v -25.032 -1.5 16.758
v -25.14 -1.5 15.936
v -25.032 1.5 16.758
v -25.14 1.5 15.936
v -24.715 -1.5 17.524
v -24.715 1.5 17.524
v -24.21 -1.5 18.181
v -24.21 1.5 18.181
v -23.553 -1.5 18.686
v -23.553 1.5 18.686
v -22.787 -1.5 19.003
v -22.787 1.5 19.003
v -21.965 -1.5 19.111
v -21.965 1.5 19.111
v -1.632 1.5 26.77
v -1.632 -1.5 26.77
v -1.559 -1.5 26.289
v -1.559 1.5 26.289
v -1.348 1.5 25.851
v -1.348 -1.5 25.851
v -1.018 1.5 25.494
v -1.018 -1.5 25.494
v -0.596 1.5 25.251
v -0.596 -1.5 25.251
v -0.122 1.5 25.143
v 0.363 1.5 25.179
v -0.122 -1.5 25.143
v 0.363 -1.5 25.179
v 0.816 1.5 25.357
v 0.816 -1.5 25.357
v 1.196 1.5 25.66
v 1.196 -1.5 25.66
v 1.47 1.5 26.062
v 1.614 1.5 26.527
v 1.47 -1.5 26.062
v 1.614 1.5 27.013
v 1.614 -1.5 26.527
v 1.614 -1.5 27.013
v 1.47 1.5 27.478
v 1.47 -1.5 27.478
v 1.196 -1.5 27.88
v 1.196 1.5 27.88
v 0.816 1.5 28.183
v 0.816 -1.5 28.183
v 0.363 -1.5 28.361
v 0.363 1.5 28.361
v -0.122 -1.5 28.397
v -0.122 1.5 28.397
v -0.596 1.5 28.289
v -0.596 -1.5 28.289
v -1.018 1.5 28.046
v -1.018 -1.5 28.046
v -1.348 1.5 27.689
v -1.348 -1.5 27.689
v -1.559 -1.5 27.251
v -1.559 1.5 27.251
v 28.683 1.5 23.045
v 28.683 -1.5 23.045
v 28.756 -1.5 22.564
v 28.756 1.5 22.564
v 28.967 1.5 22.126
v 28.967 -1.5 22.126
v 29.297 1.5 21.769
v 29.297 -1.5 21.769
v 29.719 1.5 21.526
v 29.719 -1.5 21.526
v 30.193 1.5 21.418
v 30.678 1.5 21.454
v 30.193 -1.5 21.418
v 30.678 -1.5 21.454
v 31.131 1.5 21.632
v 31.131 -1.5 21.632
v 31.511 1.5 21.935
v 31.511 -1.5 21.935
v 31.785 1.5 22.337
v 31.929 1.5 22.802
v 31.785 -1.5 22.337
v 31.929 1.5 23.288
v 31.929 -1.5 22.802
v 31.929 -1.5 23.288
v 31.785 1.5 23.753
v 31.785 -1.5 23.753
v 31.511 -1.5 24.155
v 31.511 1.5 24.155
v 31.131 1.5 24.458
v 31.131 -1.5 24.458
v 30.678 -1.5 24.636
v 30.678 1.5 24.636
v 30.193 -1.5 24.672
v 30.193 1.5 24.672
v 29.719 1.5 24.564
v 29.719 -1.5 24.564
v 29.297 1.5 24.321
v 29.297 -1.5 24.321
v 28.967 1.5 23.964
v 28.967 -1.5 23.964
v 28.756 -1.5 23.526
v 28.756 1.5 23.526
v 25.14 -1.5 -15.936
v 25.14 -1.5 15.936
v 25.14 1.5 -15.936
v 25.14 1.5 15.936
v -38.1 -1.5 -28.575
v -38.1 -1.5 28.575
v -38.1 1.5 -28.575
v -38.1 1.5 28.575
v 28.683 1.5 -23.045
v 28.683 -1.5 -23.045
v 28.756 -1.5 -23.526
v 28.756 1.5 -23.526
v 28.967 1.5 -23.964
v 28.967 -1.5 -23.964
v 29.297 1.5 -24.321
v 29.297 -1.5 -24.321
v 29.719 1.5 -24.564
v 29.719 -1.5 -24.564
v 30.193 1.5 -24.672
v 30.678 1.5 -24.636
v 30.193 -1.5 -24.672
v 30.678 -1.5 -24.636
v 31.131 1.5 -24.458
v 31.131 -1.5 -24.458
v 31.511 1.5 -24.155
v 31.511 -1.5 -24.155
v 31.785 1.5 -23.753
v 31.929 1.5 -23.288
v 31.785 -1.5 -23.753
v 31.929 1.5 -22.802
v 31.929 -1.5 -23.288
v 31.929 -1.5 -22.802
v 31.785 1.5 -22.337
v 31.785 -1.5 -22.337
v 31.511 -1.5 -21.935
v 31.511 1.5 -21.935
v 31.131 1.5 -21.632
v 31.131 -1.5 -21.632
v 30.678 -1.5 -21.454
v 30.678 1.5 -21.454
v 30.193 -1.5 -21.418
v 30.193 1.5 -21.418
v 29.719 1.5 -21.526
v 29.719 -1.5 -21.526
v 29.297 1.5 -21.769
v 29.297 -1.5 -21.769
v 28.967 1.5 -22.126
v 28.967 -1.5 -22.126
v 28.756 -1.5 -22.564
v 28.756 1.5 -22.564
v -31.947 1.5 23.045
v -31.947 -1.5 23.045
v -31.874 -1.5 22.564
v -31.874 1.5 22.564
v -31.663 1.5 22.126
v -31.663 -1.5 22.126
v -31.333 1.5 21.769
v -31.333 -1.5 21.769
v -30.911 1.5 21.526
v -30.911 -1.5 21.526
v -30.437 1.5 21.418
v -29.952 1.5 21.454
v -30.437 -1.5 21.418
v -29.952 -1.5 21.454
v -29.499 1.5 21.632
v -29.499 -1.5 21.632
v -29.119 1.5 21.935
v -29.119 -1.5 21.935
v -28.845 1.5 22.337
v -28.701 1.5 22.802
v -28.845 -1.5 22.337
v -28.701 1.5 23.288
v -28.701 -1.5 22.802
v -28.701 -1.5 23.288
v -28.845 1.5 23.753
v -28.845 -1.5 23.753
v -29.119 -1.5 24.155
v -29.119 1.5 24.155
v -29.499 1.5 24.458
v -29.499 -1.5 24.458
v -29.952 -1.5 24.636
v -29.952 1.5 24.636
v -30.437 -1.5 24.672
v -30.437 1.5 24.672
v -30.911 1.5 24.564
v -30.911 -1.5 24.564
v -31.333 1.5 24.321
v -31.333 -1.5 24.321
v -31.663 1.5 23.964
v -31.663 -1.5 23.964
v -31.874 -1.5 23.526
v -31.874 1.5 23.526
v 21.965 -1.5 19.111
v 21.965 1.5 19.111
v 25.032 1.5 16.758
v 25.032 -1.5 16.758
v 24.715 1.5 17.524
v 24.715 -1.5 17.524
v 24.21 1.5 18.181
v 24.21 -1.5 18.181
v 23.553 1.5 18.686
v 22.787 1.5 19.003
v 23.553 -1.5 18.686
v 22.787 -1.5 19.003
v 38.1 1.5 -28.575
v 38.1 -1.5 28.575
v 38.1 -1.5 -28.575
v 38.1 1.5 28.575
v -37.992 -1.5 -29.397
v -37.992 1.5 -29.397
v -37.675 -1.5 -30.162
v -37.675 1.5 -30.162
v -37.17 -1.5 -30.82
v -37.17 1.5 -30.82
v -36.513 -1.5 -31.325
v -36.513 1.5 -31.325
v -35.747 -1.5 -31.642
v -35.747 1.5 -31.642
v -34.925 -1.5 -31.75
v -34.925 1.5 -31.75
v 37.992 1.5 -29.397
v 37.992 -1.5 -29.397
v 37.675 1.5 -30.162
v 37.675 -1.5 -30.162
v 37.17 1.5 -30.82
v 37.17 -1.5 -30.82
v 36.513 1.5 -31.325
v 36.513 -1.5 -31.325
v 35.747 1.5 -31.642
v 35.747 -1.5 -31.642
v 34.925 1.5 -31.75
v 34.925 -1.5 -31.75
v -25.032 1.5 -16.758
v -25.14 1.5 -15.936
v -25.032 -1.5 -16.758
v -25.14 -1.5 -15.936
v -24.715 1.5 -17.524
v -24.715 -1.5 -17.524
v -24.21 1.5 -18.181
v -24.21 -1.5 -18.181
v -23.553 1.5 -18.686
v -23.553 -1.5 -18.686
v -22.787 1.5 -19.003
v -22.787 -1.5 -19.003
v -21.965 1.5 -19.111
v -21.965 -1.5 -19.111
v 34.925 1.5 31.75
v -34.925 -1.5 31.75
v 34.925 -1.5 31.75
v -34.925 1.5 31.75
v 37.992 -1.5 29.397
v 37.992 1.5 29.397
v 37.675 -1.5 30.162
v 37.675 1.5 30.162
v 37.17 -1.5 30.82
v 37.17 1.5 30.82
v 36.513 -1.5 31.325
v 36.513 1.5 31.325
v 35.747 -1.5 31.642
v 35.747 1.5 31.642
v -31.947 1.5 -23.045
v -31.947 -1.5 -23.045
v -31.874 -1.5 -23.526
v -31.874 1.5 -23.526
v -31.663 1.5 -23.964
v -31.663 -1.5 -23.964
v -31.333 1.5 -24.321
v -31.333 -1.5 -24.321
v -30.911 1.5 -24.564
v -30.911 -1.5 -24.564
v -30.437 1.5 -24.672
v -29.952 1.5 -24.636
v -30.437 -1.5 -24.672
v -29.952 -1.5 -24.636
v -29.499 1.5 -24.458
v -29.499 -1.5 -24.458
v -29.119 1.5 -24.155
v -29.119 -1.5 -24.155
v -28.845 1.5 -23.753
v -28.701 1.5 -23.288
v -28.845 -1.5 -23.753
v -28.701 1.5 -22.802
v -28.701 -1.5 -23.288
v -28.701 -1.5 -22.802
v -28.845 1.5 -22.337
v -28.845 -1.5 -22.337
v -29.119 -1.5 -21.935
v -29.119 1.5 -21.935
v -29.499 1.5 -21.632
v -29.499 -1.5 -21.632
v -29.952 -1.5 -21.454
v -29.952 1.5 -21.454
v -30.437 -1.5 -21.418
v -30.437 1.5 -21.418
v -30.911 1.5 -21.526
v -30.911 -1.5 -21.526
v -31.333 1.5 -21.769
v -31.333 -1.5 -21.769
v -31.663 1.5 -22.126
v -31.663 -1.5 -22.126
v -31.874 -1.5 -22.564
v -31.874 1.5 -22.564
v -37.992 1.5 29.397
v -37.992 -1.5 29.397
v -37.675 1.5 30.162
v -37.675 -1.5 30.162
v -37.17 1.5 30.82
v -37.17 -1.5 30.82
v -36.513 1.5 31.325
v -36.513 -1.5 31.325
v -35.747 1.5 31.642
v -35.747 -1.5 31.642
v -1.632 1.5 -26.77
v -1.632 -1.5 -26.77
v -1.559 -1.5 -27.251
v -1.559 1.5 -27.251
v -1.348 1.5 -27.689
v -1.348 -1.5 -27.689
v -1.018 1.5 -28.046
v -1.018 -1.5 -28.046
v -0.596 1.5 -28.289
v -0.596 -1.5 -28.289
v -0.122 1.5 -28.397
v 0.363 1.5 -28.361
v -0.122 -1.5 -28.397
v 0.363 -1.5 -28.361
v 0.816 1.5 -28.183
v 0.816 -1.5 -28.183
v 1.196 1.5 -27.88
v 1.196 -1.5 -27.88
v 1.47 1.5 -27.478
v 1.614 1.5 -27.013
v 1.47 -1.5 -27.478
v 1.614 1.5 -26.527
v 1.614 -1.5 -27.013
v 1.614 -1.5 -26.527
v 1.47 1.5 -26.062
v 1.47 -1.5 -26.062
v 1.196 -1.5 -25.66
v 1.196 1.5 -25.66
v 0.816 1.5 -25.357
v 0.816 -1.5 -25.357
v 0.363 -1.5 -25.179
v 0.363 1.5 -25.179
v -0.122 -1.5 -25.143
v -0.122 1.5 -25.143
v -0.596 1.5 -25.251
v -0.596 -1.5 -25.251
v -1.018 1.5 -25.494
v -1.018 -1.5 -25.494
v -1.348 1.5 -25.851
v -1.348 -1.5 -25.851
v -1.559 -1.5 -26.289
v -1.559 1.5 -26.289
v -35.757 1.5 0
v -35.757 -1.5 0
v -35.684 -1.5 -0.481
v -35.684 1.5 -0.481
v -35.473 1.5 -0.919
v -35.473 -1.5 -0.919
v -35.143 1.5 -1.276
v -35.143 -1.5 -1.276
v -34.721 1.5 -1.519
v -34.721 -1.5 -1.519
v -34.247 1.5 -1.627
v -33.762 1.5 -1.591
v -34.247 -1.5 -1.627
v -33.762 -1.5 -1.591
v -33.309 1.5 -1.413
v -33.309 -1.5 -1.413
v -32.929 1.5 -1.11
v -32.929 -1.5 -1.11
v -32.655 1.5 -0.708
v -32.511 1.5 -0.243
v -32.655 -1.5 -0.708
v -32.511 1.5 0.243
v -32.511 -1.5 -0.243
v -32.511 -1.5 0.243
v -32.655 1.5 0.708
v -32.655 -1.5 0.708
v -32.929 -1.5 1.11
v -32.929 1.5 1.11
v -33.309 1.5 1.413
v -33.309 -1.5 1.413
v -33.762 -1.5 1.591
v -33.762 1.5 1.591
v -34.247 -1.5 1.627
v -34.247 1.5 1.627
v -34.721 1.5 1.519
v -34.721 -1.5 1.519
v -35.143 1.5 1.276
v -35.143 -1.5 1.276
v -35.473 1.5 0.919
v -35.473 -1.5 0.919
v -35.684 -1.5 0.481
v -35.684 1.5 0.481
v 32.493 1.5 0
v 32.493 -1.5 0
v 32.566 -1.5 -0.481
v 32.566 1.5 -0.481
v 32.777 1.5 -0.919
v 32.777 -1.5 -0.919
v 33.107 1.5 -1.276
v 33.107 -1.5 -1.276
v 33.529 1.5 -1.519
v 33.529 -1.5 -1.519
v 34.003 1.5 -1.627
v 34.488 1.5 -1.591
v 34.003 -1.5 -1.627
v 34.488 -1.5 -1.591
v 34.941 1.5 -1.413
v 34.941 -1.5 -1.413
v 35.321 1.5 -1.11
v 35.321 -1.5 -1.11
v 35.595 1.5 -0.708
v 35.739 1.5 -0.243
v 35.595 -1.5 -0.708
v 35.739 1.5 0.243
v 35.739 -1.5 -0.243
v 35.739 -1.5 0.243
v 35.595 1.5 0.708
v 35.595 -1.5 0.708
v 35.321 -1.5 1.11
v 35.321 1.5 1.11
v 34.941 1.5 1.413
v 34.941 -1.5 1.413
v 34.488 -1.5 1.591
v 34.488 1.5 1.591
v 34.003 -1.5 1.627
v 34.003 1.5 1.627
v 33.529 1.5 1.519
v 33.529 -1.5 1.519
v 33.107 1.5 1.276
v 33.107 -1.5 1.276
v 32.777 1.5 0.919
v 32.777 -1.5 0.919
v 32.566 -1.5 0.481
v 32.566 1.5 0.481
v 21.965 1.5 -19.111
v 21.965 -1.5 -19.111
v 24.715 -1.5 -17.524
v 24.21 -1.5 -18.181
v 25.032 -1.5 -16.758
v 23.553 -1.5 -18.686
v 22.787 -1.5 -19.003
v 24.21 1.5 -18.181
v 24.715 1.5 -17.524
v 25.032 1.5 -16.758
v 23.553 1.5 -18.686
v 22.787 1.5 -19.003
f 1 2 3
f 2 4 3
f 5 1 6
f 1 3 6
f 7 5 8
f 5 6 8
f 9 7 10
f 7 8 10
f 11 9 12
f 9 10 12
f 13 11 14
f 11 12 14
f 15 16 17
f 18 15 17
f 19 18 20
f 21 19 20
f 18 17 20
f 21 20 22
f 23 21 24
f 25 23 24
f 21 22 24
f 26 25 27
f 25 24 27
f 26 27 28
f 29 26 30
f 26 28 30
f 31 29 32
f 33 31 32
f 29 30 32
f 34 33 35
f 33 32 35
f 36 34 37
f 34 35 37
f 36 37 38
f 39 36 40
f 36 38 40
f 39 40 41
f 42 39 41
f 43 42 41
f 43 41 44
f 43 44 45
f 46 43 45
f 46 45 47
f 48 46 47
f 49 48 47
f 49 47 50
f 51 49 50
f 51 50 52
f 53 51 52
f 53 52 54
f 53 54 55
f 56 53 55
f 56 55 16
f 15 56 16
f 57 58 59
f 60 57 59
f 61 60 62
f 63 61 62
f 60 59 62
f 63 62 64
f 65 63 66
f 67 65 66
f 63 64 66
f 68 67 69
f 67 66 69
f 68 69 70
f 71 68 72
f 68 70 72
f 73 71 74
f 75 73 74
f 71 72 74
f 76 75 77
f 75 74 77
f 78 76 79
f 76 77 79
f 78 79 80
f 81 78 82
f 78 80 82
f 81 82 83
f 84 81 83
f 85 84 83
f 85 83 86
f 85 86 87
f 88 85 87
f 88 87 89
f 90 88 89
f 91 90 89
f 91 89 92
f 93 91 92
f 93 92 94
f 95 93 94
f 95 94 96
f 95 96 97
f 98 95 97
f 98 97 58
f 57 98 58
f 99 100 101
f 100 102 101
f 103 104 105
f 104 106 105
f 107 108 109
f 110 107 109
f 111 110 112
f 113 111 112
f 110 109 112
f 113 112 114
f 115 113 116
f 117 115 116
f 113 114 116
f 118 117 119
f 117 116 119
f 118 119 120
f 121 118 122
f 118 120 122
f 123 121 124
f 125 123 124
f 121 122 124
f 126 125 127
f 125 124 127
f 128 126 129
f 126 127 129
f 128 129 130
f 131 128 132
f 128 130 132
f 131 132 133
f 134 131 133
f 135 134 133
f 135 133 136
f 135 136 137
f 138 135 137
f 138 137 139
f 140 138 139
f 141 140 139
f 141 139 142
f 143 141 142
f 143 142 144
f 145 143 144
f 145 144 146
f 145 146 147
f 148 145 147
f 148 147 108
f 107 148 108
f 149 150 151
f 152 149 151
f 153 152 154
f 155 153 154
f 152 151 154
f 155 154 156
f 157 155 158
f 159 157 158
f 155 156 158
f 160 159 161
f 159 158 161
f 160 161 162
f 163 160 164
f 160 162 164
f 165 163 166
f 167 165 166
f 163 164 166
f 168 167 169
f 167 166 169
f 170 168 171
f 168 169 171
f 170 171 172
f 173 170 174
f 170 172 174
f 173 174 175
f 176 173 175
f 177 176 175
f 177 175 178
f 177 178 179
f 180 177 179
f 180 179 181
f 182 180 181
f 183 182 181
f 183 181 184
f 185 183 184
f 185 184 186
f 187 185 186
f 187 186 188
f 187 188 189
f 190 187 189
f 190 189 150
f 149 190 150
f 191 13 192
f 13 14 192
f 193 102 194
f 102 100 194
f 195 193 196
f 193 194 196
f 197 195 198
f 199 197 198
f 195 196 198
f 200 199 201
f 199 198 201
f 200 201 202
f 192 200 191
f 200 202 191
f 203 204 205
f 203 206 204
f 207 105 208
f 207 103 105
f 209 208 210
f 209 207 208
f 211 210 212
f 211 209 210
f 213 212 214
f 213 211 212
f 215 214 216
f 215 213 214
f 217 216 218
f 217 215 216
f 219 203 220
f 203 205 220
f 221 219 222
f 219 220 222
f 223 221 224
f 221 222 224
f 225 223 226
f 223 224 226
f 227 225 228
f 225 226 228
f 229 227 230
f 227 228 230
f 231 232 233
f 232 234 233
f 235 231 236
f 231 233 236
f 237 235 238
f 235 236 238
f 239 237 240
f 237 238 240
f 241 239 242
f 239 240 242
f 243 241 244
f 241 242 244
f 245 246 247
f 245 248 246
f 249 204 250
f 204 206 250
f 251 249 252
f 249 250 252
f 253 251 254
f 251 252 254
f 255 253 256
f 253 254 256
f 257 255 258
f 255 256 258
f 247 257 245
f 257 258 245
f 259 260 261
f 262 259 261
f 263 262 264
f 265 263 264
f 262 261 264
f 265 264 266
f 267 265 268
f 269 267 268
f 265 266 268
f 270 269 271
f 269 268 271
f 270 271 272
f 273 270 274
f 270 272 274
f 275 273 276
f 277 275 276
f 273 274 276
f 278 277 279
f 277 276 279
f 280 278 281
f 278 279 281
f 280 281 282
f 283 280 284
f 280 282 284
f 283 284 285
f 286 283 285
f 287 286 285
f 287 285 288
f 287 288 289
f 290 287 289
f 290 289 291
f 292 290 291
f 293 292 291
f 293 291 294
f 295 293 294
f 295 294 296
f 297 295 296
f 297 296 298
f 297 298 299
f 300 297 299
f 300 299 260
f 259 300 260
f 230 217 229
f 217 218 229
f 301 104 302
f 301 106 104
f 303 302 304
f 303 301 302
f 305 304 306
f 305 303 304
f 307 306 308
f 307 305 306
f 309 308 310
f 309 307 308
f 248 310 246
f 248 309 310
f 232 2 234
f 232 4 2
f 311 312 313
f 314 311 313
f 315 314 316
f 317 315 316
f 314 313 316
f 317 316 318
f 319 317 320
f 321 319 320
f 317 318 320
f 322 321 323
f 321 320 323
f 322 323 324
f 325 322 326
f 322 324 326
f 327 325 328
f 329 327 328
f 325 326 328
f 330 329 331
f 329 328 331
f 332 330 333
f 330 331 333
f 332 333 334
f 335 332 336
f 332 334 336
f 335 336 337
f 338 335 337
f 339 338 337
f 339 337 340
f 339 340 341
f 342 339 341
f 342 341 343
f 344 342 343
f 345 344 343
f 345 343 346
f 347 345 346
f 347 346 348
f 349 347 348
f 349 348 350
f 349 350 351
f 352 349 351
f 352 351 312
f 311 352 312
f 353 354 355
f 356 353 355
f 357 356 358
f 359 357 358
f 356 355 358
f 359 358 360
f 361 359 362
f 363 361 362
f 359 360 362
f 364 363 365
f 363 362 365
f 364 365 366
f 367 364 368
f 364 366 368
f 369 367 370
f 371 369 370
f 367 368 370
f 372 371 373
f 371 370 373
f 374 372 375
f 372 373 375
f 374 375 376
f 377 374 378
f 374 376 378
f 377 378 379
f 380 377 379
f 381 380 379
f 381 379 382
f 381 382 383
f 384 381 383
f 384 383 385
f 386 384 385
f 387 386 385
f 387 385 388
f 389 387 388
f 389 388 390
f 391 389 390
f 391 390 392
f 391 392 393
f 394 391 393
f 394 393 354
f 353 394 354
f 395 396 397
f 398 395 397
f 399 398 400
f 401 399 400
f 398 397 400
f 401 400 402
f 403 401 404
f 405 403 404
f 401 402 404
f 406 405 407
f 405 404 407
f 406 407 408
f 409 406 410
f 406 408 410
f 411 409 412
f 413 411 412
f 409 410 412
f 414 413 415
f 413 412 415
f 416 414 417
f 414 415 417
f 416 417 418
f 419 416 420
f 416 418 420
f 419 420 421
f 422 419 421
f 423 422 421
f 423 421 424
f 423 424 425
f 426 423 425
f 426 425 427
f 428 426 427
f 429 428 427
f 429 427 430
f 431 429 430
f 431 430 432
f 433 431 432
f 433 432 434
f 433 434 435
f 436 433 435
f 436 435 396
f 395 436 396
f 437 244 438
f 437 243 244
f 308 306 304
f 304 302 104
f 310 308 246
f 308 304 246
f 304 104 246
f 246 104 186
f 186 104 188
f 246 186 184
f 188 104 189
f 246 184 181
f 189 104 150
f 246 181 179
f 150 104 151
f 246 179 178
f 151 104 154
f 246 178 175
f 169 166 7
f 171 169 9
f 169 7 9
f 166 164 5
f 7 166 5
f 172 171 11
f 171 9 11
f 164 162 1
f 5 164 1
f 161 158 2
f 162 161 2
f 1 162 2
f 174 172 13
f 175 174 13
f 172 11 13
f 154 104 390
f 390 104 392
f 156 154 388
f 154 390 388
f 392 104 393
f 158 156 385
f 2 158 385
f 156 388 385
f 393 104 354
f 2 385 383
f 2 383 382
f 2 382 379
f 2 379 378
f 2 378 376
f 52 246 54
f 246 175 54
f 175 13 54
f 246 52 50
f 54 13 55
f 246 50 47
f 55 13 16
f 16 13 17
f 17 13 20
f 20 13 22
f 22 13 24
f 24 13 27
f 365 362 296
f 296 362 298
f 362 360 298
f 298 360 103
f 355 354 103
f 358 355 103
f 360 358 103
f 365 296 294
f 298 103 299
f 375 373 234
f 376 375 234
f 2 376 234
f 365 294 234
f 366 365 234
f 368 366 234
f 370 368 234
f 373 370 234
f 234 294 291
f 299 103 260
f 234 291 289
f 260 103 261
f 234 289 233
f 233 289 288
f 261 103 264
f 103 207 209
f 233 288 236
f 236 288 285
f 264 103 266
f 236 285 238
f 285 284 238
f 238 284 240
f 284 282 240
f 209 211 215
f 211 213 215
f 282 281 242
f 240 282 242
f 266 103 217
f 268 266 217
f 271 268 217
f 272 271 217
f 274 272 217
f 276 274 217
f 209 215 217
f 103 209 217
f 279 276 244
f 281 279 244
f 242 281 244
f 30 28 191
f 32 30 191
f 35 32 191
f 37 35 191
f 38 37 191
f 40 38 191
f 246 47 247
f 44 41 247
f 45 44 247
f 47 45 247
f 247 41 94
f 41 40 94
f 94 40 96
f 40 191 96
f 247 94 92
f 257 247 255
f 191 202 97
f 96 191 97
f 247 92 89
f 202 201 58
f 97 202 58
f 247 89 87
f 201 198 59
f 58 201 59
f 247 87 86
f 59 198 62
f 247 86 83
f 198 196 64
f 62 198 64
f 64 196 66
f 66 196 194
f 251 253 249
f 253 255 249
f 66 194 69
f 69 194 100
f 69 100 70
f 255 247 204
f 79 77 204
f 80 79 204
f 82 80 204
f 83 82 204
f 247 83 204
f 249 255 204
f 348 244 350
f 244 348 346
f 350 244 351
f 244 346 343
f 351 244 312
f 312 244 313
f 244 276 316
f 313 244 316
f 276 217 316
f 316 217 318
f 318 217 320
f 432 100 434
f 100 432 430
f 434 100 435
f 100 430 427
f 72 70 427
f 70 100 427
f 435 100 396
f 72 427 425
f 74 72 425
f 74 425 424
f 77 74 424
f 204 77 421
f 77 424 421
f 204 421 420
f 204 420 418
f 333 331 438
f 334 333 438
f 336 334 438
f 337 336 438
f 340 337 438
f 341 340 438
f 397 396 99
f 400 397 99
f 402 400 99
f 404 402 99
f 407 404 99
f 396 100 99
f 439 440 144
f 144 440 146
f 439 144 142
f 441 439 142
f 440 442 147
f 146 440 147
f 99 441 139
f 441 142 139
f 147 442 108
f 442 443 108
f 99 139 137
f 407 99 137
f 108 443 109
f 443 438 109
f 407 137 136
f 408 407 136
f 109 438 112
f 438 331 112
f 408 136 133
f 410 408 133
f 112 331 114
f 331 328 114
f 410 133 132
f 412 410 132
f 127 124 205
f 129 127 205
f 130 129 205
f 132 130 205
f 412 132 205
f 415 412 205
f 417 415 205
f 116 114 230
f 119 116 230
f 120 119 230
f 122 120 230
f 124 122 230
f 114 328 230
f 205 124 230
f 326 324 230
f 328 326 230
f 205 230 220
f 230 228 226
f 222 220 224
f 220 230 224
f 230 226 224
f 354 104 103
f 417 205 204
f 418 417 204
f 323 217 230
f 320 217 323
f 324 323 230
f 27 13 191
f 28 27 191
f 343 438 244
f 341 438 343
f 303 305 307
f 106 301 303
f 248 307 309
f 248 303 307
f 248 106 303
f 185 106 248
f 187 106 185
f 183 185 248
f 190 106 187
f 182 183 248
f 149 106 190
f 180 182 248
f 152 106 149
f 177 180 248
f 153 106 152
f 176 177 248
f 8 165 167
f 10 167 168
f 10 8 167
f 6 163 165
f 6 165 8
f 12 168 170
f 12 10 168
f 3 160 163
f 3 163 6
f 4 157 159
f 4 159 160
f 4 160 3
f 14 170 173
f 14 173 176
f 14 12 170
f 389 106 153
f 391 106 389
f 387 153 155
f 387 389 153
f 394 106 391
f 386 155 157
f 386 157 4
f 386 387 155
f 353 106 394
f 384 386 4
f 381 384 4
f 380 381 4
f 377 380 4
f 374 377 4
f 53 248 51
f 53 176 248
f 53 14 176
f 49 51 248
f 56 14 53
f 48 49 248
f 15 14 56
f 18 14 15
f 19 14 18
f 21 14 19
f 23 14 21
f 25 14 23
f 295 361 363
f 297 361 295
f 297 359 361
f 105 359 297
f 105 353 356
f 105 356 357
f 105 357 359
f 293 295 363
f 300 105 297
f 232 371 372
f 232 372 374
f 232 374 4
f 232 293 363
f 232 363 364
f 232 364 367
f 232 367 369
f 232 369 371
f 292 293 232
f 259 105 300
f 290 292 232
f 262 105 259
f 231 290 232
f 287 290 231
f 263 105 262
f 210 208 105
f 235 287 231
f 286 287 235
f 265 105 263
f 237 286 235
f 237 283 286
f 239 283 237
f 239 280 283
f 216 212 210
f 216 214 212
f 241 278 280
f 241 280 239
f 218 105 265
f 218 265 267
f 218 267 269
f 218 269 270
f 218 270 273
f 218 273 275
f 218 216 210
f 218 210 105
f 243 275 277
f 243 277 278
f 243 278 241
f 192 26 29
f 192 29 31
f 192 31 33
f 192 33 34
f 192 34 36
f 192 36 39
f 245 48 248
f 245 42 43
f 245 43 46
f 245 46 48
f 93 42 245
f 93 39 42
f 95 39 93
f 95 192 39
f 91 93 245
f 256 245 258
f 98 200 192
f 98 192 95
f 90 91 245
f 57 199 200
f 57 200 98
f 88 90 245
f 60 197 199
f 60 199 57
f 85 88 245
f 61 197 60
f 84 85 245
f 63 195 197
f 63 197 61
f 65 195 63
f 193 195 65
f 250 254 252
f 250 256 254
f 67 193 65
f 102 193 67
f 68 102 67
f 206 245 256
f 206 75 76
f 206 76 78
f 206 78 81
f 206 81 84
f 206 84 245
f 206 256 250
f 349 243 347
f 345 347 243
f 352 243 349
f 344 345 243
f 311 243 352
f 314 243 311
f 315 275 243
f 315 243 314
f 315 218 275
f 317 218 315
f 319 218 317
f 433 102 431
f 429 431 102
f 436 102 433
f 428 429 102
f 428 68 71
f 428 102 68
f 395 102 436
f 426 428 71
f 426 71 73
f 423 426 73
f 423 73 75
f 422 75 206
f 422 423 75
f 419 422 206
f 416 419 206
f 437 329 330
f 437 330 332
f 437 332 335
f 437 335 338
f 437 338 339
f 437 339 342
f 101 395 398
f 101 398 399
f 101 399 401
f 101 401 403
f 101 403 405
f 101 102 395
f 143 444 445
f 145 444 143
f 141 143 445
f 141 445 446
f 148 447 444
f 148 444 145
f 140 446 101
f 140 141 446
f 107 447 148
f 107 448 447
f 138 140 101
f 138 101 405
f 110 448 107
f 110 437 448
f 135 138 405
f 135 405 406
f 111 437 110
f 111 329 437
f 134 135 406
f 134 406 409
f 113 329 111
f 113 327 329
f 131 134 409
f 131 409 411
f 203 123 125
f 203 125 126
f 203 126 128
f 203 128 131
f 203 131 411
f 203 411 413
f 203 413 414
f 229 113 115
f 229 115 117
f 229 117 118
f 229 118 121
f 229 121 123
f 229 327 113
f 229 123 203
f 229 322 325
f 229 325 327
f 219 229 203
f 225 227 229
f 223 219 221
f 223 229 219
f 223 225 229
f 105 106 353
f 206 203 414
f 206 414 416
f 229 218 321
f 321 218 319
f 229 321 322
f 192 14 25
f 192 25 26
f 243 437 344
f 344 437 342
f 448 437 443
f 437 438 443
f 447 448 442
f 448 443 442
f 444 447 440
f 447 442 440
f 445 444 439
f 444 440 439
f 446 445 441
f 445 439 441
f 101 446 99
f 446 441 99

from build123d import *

# Parameters (mm, degrees)
SKETCH1_W                 = 76.2
SKETCH1_H                 = 63.5
SKETCH1_W_2               = 50.280812534
SKETCH1_H_2               = 38.222705752
BOSS_EXTRUDE1_DEPTH       = 1.5
FILLET1_R                 = 3.175
F_4_CLEARANCE_HOLE1_D     = 3.2639
F_4_CLEARANCE_HOLE1_DEPTH = 6.619425513
F_4_CLEARANCE_HOLE1_TIP   = 0.980574487


with BuildPart() as part:
    # Sketch1 → Boss-Extrude1 (new body, symmetric)
    with BuildSketch(Plane(origin=(0, 0, 0), x_dir=(1, 0, 0), z_dir=(0, 1, 0))):
        Rectangle(SKETCH1_W, SKETCH1_H)
        Rectangle(SKETCH1_W_2, SKETCH1_H_2, mode=Mode.SUBTRACT)
    extrude(amount=BOSS_EXTRUDE1_DEPTH, both=True)

    # Fillet1
    fillet1_edges = [part.edges().sort_by_distance(p)[0] for p in [
        (25.140406267, 0, 19.111352876),
        (25.140406267, 0, -19.111352876),
        (-25.140406267, 0, -19.111352876),
        (-25.140406267, 0, 19.111352876),
        (38.1, 0, 31.75),
        (-38.1, 0, 31.75),
        (-38.1, 0, -31.75),
        (38.1, 0, -31.75),
    ]]
    fillet(fillet1_edges, radius=FILLET1_R)

    # #4 Clearance Hole1
    with Locations(Plane(origin=(0, 1.5, 0), x_dir=(1, 0, 0), z_dir=(0, 1, 0))):
        with Locations((-34.125, 0), (-30.315, -23.045), (0, -26.77), (30.315, -23.045), (34.125, 0), (30.315, 23.045), (0, 26.77), (-30.315, 23.045)):
            Hole(F_4_CLEARANCE_HOLE1_D / 2, depth=F_4_CLEARANCE_HOLE1_DEPTH)
            with Locations((0, 0, -(F_4_CLEARANCE_HOLE1_DEPTH + F_4_CLEARANCE_HOLE1_TIP / 2))):  # 118° drill point
                Cone(0, F_4_CLEARANCE_HOLE1_D / 2, F_4_CLEARANCE_HOLE1_TIP, mode=Mode.SUBTRACT)


solid = part.part
